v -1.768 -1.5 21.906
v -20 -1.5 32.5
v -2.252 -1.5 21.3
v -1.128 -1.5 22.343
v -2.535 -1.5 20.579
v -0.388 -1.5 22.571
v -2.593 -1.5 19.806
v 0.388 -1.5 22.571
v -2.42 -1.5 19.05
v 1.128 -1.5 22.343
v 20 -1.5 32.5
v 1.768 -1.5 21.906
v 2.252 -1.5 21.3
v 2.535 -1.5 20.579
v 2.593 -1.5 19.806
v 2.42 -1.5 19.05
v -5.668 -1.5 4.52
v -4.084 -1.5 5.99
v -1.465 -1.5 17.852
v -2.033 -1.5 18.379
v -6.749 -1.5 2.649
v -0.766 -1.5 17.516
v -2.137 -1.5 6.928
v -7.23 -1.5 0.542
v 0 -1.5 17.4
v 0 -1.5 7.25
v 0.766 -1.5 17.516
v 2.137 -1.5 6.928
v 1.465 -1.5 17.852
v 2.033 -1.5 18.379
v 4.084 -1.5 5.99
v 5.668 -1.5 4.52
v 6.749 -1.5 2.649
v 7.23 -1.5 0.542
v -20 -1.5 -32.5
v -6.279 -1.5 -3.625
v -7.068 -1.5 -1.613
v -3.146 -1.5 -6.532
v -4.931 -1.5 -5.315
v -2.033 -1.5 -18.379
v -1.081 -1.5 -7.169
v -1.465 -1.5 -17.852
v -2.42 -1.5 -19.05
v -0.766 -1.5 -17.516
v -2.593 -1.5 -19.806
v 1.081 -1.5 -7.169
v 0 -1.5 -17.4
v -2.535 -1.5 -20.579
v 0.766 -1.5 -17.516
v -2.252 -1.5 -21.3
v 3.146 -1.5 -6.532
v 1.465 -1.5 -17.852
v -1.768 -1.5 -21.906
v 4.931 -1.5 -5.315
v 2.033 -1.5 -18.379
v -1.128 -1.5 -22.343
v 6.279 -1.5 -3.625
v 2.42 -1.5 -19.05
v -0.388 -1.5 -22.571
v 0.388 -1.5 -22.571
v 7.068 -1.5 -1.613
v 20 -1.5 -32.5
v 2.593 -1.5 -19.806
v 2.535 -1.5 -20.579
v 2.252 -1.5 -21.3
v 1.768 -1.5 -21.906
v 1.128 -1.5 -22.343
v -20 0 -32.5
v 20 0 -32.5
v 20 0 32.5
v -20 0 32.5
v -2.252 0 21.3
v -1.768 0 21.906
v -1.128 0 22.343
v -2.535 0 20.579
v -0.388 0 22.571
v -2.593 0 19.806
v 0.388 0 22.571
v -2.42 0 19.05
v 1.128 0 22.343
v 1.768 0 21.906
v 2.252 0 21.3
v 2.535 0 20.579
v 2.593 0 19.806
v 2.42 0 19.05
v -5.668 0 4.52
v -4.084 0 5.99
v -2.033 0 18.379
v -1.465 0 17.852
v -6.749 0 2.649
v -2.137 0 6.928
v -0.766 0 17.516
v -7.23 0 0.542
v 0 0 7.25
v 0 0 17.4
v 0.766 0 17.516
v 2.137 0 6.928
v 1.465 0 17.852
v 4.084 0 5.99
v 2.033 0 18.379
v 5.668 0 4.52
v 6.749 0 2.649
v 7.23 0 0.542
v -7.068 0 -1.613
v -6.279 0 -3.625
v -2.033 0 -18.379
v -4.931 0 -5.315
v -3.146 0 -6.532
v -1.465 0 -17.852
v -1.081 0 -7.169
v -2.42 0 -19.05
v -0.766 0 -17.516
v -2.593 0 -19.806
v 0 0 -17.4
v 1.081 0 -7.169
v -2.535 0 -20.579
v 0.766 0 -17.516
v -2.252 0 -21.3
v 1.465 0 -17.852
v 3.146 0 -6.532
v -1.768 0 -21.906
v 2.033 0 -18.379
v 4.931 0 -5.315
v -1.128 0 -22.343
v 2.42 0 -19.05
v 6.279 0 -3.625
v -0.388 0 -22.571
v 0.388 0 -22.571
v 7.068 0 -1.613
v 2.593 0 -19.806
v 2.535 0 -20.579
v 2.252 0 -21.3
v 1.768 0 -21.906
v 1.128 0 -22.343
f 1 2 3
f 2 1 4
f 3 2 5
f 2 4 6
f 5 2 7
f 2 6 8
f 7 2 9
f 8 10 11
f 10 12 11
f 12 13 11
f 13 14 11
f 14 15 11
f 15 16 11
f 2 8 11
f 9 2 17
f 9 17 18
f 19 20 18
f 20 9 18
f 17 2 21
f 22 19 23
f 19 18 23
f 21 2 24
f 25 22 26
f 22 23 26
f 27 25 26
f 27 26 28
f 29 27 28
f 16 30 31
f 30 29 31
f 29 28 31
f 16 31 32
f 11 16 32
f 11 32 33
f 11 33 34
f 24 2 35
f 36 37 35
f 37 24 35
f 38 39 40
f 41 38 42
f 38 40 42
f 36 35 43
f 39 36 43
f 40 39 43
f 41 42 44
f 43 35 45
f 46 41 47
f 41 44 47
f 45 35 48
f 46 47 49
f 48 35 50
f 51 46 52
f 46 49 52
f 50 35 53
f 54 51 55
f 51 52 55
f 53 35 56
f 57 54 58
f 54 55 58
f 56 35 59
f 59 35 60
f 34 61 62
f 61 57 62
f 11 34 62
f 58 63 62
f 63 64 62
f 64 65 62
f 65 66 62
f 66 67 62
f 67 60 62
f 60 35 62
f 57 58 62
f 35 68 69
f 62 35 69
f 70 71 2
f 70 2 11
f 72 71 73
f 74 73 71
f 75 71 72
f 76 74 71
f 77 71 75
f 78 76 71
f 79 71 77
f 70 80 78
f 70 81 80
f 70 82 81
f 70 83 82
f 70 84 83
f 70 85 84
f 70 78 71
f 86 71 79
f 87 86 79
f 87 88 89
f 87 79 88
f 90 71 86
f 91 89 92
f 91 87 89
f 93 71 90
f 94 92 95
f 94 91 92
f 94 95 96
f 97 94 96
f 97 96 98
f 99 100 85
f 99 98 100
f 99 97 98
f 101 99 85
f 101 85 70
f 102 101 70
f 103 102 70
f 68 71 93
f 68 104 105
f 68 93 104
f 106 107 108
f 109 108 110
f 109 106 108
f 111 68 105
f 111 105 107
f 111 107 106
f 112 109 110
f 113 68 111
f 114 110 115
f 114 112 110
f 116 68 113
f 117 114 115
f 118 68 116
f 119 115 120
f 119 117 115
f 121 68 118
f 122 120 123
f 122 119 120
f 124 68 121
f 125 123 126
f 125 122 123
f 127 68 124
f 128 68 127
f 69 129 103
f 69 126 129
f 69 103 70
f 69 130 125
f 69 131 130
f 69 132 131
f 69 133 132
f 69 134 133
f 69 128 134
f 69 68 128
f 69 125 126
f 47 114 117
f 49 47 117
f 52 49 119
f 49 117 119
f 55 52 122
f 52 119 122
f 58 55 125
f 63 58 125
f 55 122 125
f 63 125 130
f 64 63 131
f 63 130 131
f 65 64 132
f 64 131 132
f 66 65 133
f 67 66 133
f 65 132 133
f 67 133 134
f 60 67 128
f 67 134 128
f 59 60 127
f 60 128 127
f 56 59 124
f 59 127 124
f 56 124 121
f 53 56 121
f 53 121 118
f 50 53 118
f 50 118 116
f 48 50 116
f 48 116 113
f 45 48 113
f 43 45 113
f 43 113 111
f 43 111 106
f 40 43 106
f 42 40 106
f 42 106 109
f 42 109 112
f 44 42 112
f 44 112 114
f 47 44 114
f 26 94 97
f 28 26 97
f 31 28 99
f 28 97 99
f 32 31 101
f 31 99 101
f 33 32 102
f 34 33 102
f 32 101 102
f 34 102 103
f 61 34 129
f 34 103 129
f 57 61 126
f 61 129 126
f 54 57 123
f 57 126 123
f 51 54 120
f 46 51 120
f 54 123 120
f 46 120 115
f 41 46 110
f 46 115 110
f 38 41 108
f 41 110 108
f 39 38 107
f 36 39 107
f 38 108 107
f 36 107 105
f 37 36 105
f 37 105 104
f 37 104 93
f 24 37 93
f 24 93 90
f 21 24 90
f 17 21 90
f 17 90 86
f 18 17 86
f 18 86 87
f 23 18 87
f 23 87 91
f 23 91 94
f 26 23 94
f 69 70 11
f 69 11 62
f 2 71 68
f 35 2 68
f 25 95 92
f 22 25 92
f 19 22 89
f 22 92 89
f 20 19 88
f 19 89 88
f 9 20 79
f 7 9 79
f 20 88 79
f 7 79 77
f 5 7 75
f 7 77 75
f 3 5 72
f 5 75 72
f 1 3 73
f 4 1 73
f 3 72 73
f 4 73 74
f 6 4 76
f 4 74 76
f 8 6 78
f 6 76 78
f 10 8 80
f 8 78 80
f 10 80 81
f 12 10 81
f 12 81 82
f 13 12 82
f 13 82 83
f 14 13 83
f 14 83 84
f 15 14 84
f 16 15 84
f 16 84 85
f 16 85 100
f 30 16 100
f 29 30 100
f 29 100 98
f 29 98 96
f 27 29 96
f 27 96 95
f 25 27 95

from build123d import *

# Parameters (mm, degrees)
ESQUISSE1_W               = 40
ESQUISSE1_H               = 65
T_LE_DE_BASE_PLI_E1_DEPTH = 1.5
PASSAGE_VIS_M5_REACH      = 40.19
ESQUISSE6_R               = 2.6
PASSAGE_JAUGE_REACH       = 40.19
ESQUISSE7_R               = 7.25


# Sheet-metal steps are written as plain solids
with BuildPart() as part:
    # Esquisse1 → Tôle de base pliée1 (new body)
    with BuildSketch(Plane(origin=(0, 0, 0), x_dir=(1, 0, 0), z_dir=(0, 1, 0))):
        Rectangle(ESQUISSE1_W, ESQUISSE1_H)
    extrude(amount=-T_LE_DE_BASE_PLI_E1_DEPTH)

    # Esquisse6 → Passage_Vis_M5 (cut, up to next)
    with BuildSketch(Plane(origin=(0, 0, 0), x_dir=(1, 0, 0), z_dir=(0, 1, 0)), mode=Mode.PRIVATE) as passage_vis_m5_sk1:
        with Locations(Location((0, 20, 0), (0, 0, 270))):
            Circle(ESQUISSE6_R)
    passage_vis_m5_tool1 = extrude(passage_vis_m5_sk1.sketch, amount=-PASSAGE_VIS_M5_REACH, mode=Mode.PRIVATE) & part.part
    # Esquisse6 → Passage_Vis_M5 (cut, up to next)
    with BuildSketch(Plane(origin=(0, 0, 0), x_dir=(1, 0, 0), z_dir=(0, 1, 0)), mode=Mode.PRIVATE) as passage_vis_m5_sk2:
        with Locations(Location((0, -20, 0), (0, 0, 90))):
            Circle(ESQUISSE6_R)
    passage_vis_m5_tool2 = extrude(passage_vis_m5_sk2.sketch, amount=-PASSAGE_VIS_M5_REACH, mode=Mode.PRIVATE) & part.part
    add(passage_vis_m5_tool1.solids().sort_by_distance((0, 0, -20))[0], mode=Mode.SUBTRACT)
    add(passage_vis_m5_tool2.solids().sort_by_distance((0, 0, 20))[0], mode=Mode.SUBTRACT)

    # Esquisse7 → Passage_Jauge (cut, up to next)
    with BuildSketch(Plane(origin=(0, 0, 0), x_dir=(1, 0, 0), z_dir=(0, 1, 0)), mode=Mode.PRIVATE) as passage_jauge_sk1:
        with Locations(Location((0, 0, 0), (0, 0, 270))):
            Circle(ESQUISSE7_R)
    passage_jauge_tool1 = extrude(passage_jauge_sk1.sketch, amount=-PASSAGE_JAUGE_REACH, mode=Mode.PRIVATE) & part.part
    add(passage_jauge_tool1.solids().sort_by_distance((0, 0, 0))[0], mode=Mode.SUBTRACT)


solid = part.part
